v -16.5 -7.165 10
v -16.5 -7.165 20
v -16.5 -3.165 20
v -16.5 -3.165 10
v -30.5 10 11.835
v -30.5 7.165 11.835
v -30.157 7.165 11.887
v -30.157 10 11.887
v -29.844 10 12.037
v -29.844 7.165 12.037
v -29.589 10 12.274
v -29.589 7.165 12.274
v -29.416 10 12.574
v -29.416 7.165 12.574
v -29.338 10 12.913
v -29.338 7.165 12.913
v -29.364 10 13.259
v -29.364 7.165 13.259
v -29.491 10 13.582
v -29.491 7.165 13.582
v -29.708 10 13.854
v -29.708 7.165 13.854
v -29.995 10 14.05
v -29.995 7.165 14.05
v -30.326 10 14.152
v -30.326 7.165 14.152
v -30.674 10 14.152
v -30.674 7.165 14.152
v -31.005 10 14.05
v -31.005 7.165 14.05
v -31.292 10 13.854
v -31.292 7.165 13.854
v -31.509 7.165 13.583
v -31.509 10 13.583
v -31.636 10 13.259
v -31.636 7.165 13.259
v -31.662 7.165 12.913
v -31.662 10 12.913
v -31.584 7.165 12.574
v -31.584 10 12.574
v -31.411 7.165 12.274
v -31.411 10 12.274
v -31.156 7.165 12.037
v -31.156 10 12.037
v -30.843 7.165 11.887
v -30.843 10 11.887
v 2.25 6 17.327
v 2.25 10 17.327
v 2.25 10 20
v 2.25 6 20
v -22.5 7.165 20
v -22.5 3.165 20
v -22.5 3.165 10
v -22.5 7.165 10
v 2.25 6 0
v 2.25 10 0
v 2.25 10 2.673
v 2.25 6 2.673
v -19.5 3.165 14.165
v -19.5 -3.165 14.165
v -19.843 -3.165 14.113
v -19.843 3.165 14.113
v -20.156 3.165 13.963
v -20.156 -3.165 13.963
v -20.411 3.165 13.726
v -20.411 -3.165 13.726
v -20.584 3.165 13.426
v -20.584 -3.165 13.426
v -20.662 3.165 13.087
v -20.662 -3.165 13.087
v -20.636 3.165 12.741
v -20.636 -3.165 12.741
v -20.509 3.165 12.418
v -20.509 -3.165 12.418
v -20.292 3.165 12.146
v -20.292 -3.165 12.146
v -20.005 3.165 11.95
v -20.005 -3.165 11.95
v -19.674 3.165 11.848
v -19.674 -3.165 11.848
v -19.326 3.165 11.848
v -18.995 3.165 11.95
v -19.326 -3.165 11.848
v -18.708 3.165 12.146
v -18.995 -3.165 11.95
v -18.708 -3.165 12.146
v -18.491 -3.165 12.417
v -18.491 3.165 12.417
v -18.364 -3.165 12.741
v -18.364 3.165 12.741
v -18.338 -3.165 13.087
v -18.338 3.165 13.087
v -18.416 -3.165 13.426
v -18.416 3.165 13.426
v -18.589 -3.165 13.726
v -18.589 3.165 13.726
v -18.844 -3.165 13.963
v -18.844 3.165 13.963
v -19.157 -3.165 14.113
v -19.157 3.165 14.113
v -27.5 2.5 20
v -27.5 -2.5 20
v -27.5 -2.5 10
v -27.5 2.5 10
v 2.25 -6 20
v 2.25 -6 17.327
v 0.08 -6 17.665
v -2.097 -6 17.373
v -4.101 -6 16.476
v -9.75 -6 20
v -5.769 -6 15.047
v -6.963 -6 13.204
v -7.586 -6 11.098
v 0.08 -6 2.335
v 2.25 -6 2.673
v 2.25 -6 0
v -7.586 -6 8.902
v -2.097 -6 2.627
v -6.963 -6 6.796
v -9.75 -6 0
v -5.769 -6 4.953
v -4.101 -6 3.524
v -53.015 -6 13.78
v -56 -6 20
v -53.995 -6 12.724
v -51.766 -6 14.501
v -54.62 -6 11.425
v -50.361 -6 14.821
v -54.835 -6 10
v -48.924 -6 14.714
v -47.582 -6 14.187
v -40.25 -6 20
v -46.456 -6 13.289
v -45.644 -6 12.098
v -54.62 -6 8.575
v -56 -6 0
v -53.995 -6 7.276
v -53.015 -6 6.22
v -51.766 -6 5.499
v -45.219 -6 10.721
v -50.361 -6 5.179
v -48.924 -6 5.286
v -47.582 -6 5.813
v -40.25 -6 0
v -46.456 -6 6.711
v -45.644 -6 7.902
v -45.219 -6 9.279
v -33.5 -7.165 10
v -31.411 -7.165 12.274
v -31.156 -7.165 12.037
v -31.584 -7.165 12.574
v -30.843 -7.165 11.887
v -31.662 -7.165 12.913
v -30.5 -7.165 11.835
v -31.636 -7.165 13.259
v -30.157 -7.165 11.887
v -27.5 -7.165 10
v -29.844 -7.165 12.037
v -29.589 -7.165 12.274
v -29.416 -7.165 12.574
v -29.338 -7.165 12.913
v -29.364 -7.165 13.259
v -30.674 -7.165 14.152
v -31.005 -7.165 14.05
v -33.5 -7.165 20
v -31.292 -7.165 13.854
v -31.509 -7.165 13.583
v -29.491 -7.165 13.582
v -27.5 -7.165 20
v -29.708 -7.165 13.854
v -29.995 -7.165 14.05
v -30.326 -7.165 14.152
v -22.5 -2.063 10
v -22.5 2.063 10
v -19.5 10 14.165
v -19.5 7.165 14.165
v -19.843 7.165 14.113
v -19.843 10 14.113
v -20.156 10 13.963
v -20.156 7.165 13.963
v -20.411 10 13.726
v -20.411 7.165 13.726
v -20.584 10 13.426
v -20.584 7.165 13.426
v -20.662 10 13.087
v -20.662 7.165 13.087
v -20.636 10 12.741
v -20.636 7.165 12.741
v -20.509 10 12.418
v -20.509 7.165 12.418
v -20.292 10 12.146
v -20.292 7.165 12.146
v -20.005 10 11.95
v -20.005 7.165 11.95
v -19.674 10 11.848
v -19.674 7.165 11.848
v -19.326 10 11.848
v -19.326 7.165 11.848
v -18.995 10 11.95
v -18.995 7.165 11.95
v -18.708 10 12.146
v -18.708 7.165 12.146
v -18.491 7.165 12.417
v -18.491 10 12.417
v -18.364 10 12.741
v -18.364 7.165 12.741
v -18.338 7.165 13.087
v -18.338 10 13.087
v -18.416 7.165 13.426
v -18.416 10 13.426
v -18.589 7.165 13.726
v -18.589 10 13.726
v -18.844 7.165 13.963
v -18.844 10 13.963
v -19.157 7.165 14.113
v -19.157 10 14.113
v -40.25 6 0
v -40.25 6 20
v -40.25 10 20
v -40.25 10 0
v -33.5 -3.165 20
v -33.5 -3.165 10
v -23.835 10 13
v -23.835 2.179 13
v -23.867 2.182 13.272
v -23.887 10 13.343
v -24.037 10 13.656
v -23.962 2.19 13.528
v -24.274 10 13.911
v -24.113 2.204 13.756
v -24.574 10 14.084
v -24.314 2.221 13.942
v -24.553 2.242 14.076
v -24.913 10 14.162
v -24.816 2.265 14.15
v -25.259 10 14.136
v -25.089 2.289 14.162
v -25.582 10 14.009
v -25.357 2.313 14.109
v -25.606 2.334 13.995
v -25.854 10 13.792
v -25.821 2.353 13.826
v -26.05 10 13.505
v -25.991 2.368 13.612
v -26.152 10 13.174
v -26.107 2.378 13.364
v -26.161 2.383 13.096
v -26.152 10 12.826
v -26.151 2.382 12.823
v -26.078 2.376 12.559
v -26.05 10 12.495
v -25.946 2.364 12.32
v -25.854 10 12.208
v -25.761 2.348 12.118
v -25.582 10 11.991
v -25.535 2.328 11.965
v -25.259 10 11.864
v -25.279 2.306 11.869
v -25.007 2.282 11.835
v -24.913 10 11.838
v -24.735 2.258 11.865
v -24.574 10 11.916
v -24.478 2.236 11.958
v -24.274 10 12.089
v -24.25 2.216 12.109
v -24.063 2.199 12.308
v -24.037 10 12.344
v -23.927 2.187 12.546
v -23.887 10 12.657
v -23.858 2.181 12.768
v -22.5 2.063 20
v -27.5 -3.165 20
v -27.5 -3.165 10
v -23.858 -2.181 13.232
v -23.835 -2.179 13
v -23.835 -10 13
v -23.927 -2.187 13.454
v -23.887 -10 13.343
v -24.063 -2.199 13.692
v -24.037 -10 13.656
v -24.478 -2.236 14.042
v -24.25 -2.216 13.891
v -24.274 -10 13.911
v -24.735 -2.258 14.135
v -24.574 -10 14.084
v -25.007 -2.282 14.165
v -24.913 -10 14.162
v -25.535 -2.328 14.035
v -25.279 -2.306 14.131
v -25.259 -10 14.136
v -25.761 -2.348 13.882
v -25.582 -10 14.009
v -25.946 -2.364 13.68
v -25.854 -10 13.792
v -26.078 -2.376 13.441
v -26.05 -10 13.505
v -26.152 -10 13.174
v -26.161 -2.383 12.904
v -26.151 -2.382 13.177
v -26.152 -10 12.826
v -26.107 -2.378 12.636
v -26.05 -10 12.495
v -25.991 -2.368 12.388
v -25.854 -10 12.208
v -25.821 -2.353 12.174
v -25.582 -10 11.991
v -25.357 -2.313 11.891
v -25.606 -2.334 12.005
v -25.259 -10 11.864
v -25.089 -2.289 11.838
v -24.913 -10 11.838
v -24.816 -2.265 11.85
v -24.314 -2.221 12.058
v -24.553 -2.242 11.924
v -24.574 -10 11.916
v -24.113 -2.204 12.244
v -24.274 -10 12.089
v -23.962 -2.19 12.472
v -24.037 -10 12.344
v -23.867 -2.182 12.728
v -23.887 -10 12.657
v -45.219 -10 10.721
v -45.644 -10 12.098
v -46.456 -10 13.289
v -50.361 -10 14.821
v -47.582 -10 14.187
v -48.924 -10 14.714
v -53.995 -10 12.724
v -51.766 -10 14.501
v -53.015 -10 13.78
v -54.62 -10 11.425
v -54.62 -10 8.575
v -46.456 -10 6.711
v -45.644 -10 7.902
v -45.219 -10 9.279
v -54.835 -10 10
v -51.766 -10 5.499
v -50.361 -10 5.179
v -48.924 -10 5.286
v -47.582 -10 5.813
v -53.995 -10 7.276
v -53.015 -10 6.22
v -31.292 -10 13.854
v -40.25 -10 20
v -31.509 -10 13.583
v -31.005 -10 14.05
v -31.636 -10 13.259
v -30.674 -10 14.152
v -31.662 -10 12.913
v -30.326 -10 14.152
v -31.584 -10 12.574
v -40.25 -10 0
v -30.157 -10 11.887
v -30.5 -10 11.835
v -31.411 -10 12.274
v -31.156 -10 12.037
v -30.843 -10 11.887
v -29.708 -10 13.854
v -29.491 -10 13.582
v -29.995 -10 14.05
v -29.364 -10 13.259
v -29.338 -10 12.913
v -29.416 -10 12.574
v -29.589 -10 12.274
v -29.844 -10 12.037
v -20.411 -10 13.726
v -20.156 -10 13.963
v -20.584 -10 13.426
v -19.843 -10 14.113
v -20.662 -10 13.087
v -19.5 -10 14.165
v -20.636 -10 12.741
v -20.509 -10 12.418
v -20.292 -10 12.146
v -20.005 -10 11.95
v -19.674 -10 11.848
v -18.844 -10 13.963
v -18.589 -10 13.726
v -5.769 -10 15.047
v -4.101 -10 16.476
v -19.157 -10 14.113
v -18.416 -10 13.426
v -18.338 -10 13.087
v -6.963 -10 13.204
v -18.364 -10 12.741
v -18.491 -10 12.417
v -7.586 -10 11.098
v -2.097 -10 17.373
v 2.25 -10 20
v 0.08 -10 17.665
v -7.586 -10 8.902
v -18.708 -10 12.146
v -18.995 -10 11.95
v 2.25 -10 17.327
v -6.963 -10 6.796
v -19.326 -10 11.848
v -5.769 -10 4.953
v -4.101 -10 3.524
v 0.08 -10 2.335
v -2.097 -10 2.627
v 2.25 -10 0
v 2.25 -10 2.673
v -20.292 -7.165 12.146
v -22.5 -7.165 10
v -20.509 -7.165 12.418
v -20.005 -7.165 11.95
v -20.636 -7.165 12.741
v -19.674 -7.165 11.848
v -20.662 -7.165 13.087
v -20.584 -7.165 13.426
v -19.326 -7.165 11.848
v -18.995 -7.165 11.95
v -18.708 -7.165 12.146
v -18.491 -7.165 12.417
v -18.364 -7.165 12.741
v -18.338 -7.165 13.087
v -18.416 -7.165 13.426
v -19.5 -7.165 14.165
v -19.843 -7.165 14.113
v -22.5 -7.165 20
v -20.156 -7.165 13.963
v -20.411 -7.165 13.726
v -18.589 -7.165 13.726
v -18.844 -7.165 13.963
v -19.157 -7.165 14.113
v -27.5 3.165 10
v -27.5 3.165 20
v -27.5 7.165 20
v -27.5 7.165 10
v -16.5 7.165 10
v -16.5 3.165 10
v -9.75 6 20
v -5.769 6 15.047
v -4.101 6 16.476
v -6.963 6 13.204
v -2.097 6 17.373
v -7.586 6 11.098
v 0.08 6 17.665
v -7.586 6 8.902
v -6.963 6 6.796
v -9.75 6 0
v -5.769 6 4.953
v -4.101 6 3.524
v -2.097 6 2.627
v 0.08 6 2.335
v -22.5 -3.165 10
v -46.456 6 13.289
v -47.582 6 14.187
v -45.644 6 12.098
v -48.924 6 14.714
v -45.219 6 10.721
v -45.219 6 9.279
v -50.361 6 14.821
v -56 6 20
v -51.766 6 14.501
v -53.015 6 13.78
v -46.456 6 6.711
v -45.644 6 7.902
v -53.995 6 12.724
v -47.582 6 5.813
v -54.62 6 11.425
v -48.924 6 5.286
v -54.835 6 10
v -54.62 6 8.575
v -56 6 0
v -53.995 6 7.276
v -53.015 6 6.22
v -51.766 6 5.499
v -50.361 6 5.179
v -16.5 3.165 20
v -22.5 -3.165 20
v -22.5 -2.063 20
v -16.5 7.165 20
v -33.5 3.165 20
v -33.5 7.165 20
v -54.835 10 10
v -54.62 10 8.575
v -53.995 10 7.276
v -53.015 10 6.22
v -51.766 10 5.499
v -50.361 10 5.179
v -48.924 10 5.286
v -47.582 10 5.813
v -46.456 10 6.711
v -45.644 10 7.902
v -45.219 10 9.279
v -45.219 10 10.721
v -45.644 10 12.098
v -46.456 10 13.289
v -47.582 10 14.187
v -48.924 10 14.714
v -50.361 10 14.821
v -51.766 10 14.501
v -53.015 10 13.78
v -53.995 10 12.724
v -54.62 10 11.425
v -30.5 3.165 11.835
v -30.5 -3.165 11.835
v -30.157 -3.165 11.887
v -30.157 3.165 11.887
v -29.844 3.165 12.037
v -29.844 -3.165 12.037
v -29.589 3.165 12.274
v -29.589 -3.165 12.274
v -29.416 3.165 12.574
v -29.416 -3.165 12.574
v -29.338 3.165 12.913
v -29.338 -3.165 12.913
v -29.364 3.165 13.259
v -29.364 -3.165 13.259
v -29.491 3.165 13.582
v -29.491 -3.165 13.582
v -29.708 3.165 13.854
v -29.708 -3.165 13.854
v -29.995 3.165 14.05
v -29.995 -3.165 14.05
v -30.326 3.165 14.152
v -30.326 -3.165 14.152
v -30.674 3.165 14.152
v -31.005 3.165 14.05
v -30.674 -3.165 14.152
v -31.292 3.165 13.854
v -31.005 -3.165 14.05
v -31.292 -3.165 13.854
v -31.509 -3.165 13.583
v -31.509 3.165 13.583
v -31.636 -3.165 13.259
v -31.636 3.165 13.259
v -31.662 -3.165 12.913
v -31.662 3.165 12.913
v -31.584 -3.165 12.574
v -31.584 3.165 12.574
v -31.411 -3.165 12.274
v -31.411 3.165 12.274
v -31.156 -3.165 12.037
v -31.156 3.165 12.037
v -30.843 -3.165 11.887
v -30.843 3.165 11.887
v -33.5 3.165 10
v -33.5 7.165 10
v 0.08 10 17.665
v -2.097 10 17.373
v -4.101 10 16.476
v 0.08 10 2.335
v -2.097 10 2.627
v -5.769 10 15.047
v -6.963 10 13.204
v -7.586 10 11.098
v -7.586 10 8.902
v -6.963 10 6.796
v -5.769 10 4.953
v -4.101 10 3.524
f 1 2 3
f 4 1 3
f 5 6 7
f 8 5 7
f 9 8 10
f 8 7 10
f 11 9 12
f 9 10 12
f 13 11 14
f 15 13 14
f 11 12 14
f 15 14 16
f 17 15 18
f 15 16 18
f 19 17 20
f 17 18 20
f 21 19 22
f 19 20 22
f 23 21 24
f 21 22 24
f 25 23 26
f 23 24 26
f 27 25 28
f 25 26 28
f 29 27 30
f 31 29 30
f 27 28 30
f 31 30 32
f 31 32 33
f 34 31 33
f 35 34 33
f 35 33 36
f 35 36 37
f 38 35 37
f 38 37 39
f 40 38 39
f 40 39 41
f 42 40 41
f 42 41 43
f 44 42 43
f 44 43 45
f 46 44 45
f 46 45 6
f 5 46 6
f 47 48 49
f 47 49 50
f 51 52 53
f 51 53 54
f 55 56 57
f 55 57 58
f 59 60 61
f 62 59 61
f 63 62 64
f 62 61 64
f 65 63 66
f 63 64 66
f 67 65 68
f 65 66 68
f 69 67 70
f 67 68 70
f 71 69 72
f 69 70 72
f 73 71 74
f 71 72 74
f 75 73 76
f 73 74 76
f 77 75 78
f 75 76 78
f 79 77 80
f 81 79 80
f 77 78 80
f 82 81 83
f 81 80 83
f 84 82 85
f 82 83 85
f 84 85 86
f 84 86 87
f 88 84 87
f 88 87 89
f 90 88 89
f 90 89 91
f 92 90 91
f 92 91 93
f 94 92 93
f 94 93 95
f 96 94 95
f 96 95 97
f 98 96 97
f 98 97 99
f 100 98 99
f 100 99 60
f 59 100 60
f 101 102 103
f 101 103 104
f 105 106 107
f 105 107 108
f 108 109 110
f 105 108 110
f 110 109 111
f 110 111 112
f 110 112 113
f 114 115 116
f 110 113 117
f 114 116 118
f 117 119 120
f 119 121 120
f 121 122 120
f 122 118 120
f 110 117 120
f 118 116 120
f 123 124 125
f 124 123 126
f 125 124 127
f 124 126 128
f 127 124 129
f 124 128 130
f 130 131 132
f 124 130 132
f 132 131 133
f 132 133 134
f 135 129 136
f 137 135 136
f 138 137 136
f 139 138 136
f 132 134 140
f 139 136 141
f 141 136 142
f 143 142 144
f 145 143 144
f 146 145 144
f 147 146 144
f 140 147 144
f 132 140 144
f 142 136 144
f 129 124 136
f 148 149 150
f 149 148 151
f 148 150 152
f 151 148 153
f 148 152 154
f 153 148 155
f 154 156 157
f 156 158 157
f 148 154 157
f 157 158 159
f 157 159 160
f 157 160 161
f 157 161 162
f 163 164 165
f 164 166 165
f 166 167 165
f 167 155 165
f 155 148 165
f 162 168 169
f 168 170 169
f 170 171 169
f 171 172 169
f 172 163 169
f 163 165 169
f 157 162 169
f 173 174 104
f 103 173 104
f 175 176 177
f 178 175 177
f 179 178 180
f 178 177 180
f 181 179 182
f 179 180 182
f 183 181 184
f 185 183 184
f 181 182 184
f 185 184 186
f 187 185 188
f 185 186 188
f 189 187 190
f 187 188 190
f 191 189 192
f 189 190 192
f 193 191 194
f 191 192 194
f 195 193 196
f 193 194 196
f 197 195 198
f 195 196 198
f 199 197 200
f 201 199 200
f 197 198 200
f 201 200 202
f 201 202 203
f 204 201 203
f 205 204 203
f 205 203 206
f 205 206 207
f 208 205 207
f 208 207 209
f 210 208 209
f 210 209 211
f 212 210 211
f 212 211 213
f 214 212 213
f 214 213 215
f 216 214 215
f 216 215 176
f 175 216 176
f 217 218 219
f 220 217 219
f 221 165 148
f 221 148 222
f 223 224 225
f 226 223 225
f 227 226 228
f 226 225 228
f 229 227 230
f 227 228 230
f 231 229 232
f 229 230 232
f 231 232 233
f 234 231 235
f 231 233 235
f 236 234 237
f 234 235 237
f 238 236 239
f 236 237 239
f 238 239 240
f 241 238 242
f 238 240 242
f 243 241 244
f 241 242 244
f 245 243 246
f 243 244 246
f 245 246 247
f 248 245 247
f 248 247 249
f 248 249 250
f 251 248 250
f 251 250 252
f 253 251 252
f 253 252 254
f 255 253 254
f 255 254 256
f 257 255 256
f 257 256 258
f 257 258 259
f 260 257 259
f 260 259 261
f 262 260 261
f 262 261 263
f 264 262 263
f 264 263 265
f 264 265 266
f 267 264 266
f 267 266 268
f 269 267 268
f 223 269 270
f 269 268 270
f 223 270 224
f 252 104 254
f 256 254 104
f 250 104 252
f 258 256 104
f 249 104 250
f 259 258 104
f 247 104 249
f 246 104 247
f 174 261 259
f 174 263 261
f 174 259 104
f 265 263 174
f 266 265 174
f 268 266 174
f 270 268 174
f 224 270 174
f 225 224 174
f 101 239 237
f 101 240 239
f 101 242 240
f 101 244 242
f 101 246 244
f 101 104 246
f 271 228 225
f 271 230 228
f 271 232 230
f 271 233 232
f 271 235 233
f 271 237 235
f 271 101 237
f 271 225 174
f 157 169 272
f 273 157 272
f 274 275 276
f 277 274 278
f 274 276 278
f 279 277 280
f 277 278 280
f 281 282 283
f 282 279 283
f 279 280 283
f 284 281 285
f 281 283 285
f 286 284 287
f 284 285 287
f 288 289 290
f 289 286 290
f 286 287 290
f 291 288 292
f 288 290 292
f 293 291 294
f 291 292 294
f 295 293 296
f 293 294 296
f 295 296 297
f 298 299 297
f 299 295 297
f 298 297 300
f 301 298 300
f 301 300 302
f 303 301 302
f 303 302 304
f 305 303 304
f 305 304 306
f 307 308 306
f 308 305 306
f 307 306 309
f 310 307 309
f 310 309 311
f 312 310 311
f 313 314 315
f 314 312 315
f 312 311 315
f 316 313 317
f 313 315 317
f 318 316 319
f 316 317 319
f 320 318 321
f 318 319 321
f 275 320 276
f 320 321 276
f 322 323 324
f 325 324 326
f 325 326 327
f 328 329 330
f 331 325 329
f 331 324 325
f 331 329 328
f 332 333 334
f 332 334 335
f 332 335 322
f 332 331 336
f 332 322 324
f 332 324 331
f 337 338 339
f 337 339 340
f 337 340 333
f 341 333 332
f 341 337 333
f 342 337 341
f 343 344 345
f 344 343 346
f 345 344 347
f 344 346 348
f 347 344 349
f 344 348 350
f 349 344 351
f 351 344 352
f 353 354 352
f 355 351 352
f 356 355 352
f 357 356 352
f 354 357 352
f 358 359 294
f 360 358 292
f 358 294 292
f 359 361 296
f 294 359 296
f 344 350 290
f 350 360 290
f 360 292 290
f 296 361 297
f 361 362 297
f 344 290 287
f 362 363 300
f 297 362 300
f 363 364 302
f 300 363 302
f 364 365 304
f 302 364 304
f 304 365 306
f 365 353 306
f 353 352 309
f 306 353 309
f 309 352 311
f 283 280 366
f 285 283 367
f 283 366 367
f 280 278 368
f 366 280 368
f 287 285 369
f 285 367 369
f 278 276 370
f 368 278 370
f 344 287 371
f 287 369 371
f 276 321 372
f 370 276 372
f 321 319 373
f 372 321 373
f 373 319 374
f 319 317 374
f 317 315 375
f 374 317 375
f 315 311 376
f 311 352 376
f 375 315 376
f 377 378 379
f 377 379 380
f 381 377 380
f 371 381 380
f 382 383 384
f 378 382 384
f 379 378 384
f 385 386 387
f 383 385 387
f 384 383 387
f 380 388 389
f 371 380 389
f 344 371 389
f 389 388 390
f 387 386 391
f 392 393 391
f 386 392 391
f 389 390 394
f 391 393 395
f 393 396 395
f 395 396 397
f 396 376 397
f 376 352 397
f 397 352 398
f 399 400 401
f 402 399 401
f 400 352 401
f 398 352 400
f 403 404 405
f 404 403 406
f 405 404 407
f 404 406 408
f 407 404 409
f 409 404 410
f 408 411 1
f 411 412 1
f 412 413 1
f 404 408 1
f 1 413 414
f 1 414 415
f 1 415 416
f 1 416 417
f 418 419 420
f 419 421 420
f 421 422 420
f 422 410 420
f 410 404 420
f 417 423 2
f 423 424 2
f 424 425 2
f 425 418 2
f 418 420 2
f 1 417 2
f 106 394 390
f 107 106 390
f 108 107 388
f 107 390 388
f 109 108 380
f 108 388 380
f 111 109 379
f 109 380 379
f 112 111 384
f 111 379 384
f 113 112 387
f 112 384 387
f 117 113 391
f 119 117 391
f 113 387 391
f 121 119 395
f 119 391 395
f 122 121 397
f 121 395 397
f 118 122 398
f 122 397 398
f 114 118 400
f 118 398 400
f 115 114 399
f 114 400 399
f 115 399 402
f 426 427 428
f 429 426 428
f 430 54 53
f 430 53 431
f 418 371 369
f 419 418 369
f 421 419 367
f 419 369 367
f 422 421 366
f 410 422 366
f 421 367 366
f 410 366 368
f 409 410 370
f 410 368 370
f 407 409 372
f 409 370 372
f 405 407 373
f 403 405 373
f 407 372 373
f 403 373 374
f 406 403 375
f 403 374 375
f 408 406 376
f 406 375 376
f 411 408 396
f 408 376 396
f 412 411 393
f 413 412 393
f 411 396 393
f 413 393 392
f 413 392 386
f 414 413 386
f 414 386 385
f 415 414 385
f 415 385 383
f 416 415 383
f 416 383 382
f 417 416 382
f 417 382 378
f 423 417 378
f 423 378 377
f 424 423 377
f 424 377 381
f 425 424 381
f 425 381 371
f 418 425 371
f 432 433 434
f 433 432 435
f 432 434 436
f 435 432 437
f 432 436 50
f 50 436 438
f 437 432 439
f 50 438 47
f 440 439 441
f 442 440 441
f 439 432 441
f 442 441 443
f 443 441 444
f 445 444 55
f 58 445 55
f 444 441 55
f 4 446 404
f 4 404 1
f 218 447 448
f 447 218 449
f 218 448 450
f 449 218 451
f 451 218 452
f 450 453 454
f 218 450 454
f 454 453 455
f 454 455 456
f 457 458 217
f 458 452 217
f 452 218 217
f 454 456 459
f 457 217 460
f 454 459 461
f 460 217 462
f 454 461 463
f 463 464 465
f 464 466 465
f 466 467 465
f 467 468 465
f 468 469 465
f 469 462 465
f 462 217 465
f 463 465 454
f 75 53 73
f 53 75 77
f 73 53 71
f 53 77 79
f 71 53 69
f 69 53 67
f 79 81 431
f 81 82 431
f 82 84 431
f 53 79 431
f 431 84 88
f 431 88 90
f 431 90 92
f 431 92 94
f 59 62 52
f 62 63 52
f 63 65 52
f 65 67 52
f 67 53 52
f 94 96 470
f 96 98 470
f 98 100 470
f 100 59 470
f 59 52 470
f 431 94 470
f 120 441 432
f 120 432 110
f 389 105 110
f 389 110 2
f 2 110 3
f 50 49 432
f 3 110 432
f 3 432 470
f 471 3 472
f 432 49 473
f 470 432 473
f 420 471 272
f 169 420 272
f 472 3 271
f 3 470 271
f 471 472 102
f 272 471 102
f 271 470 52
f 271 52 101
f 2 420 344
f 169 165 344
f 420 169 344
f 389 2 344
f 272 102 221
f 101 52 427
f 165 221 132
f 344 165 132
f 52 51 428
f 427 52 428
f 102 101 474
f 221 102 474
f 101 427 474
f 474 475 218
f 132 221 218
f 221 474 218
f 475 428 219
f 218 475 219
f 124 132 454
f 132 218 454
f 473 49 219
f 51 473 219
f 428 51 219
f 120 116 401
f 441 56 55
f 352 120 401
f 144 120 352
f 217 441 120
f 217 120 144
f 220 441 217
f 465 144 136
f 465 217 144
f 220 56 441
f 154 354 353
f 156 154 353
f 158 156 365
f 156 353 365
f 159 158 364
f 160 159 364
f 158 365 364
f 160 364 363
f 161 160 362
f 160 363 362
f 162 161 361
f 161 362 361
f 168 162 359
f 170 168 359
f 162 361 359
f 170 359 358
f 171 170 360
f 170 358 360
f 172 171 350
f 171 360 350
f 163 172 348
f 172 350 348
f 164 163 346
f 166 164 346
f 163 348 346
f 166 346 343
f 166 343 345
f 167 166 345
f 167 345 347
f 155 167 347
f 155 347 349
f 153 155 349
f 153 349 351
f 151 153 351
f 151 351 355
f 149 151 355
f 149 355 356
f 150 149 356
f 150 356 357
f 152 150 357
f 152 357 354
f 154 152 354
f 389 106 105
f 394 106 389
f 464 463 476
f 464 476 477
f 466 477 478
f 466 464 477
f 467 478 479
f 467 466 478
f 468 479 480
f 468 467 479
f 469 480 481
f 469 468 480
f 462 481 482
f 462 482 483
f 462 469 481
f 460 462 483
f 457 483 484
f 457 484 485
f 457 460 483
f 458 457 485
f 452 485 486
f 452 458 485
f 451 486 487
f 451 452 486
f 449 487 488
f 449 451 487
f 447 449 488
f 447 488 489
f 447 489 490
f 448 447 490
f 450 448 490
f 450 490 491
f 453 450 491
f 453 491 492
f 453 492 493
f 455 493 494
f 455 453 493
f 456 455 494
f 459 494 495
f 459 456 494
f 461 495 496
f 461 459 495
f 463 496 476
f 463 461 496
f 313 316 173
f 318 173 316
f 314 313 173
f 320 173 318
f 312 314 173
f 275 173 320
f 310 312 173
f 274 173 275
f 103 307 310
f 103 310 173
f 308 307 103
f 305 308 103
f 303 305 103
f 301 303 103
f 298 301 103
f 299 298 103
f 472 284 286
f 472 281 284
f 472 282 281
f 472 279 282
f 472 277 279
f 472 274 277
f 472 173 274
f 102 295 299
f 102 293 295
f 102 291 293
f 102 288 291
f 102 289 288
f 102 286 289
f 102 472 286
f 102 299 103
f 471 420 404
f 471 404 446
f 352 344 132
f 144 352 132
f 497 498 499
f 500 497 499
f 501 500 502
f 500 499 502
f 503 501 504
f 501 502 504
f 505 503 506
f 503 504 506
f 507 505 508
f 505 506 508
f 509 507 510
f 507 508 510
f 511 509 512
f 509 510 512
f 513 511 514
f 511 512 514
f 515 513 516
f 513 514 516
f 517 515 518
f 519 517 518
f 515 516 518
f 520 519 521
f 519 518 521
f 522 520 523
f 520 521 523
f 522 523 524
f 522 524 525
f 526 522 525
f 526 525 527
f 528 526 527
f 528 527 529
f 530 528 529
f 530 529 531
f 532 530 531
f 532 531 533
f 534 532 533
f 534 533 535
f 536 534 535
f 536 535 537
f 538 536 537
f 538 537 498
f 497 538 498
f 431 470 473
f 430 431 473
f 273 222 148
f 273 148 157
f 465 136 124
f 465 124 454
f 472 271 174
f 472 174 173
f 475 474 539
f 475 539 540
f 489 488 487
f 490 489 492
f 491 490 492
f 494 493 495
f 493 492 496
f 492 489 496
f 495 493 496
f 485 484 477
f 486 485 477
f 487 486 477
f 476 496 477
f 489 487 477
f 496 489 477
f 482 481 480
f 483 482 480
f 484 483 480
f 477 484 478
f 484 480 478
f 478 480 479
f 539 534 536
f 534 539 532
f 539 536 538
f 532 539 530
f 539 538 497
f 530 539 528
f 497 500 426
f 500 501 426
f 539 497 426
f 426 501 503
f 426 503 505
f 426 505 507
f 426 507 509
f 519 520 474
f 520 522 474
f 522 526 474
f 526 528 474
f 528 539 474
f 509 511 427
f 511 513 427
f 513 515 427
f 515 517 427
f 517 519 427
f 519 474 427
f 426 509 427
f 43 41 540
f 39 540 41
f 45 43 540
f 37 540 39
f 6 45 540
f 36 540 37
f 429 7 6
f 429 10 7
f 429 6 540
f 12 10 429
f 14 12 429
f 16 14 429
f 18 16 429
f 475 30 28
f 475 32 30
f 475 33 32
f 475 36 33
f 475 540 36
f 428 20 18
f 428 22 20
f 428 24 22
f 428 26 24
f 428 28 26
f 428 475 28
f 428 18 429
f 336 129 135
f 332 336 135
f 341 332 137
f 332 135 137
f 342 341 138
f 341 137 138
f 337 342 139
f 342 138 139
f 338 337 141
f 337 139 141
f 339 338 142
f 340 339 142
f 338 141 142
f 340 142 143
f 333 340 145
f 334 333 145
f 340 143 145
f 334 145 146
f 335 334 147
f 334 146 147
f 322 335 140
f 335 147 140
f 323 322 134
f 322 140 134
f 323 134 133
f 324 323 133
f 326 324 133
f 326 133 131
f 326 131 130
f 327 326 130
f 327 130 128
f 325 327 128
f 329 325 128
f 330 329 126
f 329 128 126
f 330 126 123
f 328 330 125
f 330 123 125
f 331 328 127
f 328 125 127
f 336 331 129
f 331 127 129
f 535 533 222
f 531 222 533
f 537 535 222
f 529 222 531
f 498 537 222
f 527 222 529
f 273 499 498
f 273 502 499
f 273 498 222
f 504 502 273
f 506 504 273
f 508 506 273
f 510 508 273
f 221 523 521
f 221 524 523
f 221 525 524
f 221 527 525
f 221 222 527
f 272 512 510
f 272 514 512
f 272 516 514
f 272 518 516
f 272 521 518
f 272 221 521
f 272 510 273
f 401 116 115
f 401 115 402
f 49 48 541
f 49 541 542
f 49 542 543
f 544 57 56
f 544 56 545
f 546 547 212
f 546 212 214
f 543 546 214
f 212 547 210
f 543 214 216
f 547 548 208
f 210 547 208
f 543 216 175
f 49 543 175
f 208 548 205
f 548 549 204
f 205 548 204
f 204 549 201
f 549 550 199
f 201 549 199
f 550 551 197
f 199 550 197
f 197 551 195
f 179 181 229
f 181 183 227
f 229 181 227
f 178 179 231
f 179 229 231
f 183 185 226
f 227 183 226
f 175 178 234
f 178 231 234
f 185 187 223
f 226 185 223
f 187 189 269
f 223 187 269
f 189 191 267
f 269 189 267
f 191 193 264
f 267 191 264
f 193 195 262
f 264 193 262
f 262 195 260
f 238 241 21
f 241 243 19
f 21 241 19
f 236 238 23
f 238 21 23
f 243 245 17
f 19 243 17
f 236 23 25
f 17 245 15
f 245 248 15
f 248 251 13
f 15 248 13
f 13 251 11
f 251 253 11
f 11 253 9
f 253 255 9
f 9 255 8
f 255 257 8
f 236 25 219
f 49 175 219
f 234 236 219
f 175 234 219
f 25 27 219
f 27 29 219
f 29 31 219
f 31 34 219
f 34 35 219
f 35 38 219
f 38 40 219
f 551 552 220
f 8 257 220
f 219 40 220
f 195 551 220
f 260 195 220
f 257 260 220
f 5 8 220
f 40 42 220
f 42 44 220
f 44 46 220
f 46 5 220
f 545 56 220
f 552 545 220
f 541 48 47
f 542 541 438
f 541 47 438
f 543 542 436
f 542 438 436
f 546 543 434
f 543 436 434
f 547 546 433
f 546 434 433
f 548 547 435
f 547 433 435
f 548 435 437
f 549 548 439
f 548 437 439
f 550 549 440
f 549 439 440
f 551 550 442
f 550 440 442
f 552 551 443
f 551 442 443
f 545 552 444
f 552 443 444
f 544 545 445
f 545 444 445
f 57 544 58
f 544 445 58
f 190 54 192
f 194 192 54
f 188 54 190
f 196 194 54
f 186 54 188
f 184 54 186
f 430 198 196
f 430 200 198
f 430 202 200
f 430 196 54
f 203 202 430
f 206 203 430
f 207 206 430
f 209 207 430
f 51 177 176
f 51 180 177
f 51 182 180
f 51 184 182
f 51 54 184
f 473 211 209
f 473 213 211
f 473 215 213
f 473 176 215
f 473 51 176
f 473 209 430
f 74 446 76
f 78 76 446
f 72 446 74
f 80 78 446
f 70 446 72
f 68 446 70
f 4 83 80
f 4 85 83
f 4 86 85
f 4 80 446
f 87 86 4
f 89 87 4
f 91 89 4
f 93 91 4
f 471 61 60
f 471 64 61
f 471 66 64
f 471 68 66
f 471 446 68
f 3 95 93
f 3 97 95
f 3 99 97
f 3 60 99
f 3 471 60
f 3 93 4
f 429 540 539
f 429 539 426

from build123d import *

# Parameters (mm, degrees)
BOSS_EXTRUDE1_DEPTH = 20
SKETCH2_R           = 4.835
BOSS_EXTRUDE2_DEPTH = 4
CUT_EXTRUDE1_REACH  = 64.738
SKETCH3_R           = 7.665
CUT_EXTRUDE2_DEPTH  = 10
SKETCH5_W           = 6
SKETCH5_H           = 4
CUT_EXTRUDE3_DEPTH  = 10
CUT_EXTRUDE4_REACH  = 64.738
SKETCH6_R           = 1.165


with BuildPart() as part:
    # Sketch1 → Boss-Extrude1 (new body)
    with BuildSketch(Plane.XY):
        Polygon((-40.25, -10), (-40.25, -6), (-50, -6), (-56, -6), (-56, 6), (-50, 6), (-40.25, 6), (-40.25, 10), (0, 10), (2.25, 10), (2.25, 6), (0, 6), (-9.75, 6), (-9.75, -6), (0, -6), (2.25, -6), (2.25, -10), (0, -10), align=None)
    extrude(amount=BOSS_EXTRUDE1_DEPTH)

    # Sketch2 → Boss-Extrude2 (add)
    with BuildSketch(Plane.XZ.offset(6)):
        with Locations(Location((-50, 10, 0), (0, 0, 180))):
            Circle(SKETCH2_R)
    boss_extrude2 = extrude(amount=BOSS_EXTRUDE2_DEPTH)

    # Cut-Extrude1: up to this face of the body (flat: up to its plane)
    cut_extrude1_end = Plane(part.part.faces().sort_by_distance((-19, 10, 10))[0])
    # Sketch3 → Cut-Extrude1 (cut, up to the picked face)
    with BuildSketch(Plane.XZ.offset(10), mode=Mode.PRIVATE) as cut_extrude1_sk1:
        with Locations((0, 10)):
            Circle(SKETCH3_R)
    cut_extrude1_tool1 = split(extrude(cut_extrude1_sk1.sketch, amount=-CUT_EXTRUDE1_REACH, mode=Mode.PRIVATE), bisect_by=cut_extrude1_end, keep=Keep.BOTH, mode=Mode.PRIVATE)
    add(cut_extrude1_tool1.solids().sort_by(Axis((0, -10, 10), (0, 1, 0)))[0], mode=Mode.SUBTRACT)

    # Mirror1: Boss-Extrude2 across plane
    add(boss_extrude2.mirror(Plane.ZX))

    # Sketch4 → Cut-Extrude2 (cut)
    with BuildSketch(Plane.XY.offset(20)):
        Polygon((-27.5, 2.5), (-22.5, 2.062556682), (-22.5, -2.062556682), (-27.5, -2.5), align=None)
    extrude(amount=-CUT_EXTRUDE2_DEPTH, mode=Mode.SUBTRACT)

    # Sketch5 → Cut-Extrude3 (cut)
    with BuildSketch(Plane.XY.offset(20)):
        with Locations((-30.5, 5.165)):
            Rectangle(SKETCH5_W, SKETCH5_H)
        with Locations((-19.5, 5.165)):
            Rectangle(SKETCH5_W, SKETCH5_H)
        with Locations((-19.5, -5.165)):
            Rectangle(SKETCH5_W, SKETCH5_H)
        with Locations((-30.5, -5.165)):
            Rectangle(SKETCH5_W, SKETCH5_H)
    extrude(amount=-CUT_EXTRUDE3_DEPTH, mode=Mode.SUBTRACT)

    # Cut-Extrude4: up to this face of the body (flat: up to its plane)
    cut_extrude4_end = Plane(part.part.faces().sort_by_distance((-21.952820108, 10, 10))[0])
    # Sketch6 → Cut-Extrude4 (cut, up to the picked face)
    with BuildSketch(Plane.XZ.offset(10), mode=Mode.PRIVATE) as cut_extrude4_sk1:
        with Locations(Location((-30.5, 13, 0), (0, 0, 270))):
            Circle(SKETCH6_R)
    cut_extrude4_tool1 = split(extrude(cut_extrude4_sk1.sketch, amount=-CUT_EXTRUDE4_REACH, mode=Mode.PRIVATE), bisect_by=cut_extrude4_end, keep=Keep.BOTH, mode=Mode.PRIVATE)
    # Sketch6 → Cut-Extrude4 (cut, up to the picked face)
    with BuildSketch(Plane.XZ.offset(10), mode=Mode.PRIVATE) as cut_extrude4_sk2:
        with Locations((-25, 13)):
            Circle(SKETCH6_R)
    cut_extrude4_tool2 = split(extrude(cut_extrude4_sk2.sketch, amount=-CUT_EXTRUDE4_REACH, mode=Mode.PRIVATE), bisect_by=cut_extrude4_end, keep=Keep.BOTH, mode=Mode.PRIVATE)
    # Sketch6 → Cut-Extrude4 (cut, up to the picked face)
    with BuildSketch(Plane.XZ.offset(10), mode=Mode.PRIVATE) as cut_extrude4_sk3:
        with Locations(Location((-19.5, 13, 0), (0, 0, 90))):
            Circle(SKETCH6_R)
    cut_extrude4_tool3 = split(extrude(cut_extrude4_sk3.sketch, amount=-CUT_EXTRUDE4_REACH, mode=Mode.PRIVATE), bisect_by=cut_extrude4_end, keep=Keep.BOTH, mode=Mode.PRIVATE)
    add(cut_extrude4_tool1.solids().sort_by(Axis((-30.5, -10, 13), (0, 1, 0)))[0], mode=Mode.SUBTRACT)
    add(cut_extrude4_tool2.solids().sort_by(Axis((-25, -10, 13), (0, 1, 0)))[0], mode=Mode.SUBTRACT)
    add(cut_extrude4_tool3.solids().sort_by(Axis((-19.5, -10, 13), (0, 1, 0)))[0], mode=Mode.SUBTRACT)


solid = part.part
